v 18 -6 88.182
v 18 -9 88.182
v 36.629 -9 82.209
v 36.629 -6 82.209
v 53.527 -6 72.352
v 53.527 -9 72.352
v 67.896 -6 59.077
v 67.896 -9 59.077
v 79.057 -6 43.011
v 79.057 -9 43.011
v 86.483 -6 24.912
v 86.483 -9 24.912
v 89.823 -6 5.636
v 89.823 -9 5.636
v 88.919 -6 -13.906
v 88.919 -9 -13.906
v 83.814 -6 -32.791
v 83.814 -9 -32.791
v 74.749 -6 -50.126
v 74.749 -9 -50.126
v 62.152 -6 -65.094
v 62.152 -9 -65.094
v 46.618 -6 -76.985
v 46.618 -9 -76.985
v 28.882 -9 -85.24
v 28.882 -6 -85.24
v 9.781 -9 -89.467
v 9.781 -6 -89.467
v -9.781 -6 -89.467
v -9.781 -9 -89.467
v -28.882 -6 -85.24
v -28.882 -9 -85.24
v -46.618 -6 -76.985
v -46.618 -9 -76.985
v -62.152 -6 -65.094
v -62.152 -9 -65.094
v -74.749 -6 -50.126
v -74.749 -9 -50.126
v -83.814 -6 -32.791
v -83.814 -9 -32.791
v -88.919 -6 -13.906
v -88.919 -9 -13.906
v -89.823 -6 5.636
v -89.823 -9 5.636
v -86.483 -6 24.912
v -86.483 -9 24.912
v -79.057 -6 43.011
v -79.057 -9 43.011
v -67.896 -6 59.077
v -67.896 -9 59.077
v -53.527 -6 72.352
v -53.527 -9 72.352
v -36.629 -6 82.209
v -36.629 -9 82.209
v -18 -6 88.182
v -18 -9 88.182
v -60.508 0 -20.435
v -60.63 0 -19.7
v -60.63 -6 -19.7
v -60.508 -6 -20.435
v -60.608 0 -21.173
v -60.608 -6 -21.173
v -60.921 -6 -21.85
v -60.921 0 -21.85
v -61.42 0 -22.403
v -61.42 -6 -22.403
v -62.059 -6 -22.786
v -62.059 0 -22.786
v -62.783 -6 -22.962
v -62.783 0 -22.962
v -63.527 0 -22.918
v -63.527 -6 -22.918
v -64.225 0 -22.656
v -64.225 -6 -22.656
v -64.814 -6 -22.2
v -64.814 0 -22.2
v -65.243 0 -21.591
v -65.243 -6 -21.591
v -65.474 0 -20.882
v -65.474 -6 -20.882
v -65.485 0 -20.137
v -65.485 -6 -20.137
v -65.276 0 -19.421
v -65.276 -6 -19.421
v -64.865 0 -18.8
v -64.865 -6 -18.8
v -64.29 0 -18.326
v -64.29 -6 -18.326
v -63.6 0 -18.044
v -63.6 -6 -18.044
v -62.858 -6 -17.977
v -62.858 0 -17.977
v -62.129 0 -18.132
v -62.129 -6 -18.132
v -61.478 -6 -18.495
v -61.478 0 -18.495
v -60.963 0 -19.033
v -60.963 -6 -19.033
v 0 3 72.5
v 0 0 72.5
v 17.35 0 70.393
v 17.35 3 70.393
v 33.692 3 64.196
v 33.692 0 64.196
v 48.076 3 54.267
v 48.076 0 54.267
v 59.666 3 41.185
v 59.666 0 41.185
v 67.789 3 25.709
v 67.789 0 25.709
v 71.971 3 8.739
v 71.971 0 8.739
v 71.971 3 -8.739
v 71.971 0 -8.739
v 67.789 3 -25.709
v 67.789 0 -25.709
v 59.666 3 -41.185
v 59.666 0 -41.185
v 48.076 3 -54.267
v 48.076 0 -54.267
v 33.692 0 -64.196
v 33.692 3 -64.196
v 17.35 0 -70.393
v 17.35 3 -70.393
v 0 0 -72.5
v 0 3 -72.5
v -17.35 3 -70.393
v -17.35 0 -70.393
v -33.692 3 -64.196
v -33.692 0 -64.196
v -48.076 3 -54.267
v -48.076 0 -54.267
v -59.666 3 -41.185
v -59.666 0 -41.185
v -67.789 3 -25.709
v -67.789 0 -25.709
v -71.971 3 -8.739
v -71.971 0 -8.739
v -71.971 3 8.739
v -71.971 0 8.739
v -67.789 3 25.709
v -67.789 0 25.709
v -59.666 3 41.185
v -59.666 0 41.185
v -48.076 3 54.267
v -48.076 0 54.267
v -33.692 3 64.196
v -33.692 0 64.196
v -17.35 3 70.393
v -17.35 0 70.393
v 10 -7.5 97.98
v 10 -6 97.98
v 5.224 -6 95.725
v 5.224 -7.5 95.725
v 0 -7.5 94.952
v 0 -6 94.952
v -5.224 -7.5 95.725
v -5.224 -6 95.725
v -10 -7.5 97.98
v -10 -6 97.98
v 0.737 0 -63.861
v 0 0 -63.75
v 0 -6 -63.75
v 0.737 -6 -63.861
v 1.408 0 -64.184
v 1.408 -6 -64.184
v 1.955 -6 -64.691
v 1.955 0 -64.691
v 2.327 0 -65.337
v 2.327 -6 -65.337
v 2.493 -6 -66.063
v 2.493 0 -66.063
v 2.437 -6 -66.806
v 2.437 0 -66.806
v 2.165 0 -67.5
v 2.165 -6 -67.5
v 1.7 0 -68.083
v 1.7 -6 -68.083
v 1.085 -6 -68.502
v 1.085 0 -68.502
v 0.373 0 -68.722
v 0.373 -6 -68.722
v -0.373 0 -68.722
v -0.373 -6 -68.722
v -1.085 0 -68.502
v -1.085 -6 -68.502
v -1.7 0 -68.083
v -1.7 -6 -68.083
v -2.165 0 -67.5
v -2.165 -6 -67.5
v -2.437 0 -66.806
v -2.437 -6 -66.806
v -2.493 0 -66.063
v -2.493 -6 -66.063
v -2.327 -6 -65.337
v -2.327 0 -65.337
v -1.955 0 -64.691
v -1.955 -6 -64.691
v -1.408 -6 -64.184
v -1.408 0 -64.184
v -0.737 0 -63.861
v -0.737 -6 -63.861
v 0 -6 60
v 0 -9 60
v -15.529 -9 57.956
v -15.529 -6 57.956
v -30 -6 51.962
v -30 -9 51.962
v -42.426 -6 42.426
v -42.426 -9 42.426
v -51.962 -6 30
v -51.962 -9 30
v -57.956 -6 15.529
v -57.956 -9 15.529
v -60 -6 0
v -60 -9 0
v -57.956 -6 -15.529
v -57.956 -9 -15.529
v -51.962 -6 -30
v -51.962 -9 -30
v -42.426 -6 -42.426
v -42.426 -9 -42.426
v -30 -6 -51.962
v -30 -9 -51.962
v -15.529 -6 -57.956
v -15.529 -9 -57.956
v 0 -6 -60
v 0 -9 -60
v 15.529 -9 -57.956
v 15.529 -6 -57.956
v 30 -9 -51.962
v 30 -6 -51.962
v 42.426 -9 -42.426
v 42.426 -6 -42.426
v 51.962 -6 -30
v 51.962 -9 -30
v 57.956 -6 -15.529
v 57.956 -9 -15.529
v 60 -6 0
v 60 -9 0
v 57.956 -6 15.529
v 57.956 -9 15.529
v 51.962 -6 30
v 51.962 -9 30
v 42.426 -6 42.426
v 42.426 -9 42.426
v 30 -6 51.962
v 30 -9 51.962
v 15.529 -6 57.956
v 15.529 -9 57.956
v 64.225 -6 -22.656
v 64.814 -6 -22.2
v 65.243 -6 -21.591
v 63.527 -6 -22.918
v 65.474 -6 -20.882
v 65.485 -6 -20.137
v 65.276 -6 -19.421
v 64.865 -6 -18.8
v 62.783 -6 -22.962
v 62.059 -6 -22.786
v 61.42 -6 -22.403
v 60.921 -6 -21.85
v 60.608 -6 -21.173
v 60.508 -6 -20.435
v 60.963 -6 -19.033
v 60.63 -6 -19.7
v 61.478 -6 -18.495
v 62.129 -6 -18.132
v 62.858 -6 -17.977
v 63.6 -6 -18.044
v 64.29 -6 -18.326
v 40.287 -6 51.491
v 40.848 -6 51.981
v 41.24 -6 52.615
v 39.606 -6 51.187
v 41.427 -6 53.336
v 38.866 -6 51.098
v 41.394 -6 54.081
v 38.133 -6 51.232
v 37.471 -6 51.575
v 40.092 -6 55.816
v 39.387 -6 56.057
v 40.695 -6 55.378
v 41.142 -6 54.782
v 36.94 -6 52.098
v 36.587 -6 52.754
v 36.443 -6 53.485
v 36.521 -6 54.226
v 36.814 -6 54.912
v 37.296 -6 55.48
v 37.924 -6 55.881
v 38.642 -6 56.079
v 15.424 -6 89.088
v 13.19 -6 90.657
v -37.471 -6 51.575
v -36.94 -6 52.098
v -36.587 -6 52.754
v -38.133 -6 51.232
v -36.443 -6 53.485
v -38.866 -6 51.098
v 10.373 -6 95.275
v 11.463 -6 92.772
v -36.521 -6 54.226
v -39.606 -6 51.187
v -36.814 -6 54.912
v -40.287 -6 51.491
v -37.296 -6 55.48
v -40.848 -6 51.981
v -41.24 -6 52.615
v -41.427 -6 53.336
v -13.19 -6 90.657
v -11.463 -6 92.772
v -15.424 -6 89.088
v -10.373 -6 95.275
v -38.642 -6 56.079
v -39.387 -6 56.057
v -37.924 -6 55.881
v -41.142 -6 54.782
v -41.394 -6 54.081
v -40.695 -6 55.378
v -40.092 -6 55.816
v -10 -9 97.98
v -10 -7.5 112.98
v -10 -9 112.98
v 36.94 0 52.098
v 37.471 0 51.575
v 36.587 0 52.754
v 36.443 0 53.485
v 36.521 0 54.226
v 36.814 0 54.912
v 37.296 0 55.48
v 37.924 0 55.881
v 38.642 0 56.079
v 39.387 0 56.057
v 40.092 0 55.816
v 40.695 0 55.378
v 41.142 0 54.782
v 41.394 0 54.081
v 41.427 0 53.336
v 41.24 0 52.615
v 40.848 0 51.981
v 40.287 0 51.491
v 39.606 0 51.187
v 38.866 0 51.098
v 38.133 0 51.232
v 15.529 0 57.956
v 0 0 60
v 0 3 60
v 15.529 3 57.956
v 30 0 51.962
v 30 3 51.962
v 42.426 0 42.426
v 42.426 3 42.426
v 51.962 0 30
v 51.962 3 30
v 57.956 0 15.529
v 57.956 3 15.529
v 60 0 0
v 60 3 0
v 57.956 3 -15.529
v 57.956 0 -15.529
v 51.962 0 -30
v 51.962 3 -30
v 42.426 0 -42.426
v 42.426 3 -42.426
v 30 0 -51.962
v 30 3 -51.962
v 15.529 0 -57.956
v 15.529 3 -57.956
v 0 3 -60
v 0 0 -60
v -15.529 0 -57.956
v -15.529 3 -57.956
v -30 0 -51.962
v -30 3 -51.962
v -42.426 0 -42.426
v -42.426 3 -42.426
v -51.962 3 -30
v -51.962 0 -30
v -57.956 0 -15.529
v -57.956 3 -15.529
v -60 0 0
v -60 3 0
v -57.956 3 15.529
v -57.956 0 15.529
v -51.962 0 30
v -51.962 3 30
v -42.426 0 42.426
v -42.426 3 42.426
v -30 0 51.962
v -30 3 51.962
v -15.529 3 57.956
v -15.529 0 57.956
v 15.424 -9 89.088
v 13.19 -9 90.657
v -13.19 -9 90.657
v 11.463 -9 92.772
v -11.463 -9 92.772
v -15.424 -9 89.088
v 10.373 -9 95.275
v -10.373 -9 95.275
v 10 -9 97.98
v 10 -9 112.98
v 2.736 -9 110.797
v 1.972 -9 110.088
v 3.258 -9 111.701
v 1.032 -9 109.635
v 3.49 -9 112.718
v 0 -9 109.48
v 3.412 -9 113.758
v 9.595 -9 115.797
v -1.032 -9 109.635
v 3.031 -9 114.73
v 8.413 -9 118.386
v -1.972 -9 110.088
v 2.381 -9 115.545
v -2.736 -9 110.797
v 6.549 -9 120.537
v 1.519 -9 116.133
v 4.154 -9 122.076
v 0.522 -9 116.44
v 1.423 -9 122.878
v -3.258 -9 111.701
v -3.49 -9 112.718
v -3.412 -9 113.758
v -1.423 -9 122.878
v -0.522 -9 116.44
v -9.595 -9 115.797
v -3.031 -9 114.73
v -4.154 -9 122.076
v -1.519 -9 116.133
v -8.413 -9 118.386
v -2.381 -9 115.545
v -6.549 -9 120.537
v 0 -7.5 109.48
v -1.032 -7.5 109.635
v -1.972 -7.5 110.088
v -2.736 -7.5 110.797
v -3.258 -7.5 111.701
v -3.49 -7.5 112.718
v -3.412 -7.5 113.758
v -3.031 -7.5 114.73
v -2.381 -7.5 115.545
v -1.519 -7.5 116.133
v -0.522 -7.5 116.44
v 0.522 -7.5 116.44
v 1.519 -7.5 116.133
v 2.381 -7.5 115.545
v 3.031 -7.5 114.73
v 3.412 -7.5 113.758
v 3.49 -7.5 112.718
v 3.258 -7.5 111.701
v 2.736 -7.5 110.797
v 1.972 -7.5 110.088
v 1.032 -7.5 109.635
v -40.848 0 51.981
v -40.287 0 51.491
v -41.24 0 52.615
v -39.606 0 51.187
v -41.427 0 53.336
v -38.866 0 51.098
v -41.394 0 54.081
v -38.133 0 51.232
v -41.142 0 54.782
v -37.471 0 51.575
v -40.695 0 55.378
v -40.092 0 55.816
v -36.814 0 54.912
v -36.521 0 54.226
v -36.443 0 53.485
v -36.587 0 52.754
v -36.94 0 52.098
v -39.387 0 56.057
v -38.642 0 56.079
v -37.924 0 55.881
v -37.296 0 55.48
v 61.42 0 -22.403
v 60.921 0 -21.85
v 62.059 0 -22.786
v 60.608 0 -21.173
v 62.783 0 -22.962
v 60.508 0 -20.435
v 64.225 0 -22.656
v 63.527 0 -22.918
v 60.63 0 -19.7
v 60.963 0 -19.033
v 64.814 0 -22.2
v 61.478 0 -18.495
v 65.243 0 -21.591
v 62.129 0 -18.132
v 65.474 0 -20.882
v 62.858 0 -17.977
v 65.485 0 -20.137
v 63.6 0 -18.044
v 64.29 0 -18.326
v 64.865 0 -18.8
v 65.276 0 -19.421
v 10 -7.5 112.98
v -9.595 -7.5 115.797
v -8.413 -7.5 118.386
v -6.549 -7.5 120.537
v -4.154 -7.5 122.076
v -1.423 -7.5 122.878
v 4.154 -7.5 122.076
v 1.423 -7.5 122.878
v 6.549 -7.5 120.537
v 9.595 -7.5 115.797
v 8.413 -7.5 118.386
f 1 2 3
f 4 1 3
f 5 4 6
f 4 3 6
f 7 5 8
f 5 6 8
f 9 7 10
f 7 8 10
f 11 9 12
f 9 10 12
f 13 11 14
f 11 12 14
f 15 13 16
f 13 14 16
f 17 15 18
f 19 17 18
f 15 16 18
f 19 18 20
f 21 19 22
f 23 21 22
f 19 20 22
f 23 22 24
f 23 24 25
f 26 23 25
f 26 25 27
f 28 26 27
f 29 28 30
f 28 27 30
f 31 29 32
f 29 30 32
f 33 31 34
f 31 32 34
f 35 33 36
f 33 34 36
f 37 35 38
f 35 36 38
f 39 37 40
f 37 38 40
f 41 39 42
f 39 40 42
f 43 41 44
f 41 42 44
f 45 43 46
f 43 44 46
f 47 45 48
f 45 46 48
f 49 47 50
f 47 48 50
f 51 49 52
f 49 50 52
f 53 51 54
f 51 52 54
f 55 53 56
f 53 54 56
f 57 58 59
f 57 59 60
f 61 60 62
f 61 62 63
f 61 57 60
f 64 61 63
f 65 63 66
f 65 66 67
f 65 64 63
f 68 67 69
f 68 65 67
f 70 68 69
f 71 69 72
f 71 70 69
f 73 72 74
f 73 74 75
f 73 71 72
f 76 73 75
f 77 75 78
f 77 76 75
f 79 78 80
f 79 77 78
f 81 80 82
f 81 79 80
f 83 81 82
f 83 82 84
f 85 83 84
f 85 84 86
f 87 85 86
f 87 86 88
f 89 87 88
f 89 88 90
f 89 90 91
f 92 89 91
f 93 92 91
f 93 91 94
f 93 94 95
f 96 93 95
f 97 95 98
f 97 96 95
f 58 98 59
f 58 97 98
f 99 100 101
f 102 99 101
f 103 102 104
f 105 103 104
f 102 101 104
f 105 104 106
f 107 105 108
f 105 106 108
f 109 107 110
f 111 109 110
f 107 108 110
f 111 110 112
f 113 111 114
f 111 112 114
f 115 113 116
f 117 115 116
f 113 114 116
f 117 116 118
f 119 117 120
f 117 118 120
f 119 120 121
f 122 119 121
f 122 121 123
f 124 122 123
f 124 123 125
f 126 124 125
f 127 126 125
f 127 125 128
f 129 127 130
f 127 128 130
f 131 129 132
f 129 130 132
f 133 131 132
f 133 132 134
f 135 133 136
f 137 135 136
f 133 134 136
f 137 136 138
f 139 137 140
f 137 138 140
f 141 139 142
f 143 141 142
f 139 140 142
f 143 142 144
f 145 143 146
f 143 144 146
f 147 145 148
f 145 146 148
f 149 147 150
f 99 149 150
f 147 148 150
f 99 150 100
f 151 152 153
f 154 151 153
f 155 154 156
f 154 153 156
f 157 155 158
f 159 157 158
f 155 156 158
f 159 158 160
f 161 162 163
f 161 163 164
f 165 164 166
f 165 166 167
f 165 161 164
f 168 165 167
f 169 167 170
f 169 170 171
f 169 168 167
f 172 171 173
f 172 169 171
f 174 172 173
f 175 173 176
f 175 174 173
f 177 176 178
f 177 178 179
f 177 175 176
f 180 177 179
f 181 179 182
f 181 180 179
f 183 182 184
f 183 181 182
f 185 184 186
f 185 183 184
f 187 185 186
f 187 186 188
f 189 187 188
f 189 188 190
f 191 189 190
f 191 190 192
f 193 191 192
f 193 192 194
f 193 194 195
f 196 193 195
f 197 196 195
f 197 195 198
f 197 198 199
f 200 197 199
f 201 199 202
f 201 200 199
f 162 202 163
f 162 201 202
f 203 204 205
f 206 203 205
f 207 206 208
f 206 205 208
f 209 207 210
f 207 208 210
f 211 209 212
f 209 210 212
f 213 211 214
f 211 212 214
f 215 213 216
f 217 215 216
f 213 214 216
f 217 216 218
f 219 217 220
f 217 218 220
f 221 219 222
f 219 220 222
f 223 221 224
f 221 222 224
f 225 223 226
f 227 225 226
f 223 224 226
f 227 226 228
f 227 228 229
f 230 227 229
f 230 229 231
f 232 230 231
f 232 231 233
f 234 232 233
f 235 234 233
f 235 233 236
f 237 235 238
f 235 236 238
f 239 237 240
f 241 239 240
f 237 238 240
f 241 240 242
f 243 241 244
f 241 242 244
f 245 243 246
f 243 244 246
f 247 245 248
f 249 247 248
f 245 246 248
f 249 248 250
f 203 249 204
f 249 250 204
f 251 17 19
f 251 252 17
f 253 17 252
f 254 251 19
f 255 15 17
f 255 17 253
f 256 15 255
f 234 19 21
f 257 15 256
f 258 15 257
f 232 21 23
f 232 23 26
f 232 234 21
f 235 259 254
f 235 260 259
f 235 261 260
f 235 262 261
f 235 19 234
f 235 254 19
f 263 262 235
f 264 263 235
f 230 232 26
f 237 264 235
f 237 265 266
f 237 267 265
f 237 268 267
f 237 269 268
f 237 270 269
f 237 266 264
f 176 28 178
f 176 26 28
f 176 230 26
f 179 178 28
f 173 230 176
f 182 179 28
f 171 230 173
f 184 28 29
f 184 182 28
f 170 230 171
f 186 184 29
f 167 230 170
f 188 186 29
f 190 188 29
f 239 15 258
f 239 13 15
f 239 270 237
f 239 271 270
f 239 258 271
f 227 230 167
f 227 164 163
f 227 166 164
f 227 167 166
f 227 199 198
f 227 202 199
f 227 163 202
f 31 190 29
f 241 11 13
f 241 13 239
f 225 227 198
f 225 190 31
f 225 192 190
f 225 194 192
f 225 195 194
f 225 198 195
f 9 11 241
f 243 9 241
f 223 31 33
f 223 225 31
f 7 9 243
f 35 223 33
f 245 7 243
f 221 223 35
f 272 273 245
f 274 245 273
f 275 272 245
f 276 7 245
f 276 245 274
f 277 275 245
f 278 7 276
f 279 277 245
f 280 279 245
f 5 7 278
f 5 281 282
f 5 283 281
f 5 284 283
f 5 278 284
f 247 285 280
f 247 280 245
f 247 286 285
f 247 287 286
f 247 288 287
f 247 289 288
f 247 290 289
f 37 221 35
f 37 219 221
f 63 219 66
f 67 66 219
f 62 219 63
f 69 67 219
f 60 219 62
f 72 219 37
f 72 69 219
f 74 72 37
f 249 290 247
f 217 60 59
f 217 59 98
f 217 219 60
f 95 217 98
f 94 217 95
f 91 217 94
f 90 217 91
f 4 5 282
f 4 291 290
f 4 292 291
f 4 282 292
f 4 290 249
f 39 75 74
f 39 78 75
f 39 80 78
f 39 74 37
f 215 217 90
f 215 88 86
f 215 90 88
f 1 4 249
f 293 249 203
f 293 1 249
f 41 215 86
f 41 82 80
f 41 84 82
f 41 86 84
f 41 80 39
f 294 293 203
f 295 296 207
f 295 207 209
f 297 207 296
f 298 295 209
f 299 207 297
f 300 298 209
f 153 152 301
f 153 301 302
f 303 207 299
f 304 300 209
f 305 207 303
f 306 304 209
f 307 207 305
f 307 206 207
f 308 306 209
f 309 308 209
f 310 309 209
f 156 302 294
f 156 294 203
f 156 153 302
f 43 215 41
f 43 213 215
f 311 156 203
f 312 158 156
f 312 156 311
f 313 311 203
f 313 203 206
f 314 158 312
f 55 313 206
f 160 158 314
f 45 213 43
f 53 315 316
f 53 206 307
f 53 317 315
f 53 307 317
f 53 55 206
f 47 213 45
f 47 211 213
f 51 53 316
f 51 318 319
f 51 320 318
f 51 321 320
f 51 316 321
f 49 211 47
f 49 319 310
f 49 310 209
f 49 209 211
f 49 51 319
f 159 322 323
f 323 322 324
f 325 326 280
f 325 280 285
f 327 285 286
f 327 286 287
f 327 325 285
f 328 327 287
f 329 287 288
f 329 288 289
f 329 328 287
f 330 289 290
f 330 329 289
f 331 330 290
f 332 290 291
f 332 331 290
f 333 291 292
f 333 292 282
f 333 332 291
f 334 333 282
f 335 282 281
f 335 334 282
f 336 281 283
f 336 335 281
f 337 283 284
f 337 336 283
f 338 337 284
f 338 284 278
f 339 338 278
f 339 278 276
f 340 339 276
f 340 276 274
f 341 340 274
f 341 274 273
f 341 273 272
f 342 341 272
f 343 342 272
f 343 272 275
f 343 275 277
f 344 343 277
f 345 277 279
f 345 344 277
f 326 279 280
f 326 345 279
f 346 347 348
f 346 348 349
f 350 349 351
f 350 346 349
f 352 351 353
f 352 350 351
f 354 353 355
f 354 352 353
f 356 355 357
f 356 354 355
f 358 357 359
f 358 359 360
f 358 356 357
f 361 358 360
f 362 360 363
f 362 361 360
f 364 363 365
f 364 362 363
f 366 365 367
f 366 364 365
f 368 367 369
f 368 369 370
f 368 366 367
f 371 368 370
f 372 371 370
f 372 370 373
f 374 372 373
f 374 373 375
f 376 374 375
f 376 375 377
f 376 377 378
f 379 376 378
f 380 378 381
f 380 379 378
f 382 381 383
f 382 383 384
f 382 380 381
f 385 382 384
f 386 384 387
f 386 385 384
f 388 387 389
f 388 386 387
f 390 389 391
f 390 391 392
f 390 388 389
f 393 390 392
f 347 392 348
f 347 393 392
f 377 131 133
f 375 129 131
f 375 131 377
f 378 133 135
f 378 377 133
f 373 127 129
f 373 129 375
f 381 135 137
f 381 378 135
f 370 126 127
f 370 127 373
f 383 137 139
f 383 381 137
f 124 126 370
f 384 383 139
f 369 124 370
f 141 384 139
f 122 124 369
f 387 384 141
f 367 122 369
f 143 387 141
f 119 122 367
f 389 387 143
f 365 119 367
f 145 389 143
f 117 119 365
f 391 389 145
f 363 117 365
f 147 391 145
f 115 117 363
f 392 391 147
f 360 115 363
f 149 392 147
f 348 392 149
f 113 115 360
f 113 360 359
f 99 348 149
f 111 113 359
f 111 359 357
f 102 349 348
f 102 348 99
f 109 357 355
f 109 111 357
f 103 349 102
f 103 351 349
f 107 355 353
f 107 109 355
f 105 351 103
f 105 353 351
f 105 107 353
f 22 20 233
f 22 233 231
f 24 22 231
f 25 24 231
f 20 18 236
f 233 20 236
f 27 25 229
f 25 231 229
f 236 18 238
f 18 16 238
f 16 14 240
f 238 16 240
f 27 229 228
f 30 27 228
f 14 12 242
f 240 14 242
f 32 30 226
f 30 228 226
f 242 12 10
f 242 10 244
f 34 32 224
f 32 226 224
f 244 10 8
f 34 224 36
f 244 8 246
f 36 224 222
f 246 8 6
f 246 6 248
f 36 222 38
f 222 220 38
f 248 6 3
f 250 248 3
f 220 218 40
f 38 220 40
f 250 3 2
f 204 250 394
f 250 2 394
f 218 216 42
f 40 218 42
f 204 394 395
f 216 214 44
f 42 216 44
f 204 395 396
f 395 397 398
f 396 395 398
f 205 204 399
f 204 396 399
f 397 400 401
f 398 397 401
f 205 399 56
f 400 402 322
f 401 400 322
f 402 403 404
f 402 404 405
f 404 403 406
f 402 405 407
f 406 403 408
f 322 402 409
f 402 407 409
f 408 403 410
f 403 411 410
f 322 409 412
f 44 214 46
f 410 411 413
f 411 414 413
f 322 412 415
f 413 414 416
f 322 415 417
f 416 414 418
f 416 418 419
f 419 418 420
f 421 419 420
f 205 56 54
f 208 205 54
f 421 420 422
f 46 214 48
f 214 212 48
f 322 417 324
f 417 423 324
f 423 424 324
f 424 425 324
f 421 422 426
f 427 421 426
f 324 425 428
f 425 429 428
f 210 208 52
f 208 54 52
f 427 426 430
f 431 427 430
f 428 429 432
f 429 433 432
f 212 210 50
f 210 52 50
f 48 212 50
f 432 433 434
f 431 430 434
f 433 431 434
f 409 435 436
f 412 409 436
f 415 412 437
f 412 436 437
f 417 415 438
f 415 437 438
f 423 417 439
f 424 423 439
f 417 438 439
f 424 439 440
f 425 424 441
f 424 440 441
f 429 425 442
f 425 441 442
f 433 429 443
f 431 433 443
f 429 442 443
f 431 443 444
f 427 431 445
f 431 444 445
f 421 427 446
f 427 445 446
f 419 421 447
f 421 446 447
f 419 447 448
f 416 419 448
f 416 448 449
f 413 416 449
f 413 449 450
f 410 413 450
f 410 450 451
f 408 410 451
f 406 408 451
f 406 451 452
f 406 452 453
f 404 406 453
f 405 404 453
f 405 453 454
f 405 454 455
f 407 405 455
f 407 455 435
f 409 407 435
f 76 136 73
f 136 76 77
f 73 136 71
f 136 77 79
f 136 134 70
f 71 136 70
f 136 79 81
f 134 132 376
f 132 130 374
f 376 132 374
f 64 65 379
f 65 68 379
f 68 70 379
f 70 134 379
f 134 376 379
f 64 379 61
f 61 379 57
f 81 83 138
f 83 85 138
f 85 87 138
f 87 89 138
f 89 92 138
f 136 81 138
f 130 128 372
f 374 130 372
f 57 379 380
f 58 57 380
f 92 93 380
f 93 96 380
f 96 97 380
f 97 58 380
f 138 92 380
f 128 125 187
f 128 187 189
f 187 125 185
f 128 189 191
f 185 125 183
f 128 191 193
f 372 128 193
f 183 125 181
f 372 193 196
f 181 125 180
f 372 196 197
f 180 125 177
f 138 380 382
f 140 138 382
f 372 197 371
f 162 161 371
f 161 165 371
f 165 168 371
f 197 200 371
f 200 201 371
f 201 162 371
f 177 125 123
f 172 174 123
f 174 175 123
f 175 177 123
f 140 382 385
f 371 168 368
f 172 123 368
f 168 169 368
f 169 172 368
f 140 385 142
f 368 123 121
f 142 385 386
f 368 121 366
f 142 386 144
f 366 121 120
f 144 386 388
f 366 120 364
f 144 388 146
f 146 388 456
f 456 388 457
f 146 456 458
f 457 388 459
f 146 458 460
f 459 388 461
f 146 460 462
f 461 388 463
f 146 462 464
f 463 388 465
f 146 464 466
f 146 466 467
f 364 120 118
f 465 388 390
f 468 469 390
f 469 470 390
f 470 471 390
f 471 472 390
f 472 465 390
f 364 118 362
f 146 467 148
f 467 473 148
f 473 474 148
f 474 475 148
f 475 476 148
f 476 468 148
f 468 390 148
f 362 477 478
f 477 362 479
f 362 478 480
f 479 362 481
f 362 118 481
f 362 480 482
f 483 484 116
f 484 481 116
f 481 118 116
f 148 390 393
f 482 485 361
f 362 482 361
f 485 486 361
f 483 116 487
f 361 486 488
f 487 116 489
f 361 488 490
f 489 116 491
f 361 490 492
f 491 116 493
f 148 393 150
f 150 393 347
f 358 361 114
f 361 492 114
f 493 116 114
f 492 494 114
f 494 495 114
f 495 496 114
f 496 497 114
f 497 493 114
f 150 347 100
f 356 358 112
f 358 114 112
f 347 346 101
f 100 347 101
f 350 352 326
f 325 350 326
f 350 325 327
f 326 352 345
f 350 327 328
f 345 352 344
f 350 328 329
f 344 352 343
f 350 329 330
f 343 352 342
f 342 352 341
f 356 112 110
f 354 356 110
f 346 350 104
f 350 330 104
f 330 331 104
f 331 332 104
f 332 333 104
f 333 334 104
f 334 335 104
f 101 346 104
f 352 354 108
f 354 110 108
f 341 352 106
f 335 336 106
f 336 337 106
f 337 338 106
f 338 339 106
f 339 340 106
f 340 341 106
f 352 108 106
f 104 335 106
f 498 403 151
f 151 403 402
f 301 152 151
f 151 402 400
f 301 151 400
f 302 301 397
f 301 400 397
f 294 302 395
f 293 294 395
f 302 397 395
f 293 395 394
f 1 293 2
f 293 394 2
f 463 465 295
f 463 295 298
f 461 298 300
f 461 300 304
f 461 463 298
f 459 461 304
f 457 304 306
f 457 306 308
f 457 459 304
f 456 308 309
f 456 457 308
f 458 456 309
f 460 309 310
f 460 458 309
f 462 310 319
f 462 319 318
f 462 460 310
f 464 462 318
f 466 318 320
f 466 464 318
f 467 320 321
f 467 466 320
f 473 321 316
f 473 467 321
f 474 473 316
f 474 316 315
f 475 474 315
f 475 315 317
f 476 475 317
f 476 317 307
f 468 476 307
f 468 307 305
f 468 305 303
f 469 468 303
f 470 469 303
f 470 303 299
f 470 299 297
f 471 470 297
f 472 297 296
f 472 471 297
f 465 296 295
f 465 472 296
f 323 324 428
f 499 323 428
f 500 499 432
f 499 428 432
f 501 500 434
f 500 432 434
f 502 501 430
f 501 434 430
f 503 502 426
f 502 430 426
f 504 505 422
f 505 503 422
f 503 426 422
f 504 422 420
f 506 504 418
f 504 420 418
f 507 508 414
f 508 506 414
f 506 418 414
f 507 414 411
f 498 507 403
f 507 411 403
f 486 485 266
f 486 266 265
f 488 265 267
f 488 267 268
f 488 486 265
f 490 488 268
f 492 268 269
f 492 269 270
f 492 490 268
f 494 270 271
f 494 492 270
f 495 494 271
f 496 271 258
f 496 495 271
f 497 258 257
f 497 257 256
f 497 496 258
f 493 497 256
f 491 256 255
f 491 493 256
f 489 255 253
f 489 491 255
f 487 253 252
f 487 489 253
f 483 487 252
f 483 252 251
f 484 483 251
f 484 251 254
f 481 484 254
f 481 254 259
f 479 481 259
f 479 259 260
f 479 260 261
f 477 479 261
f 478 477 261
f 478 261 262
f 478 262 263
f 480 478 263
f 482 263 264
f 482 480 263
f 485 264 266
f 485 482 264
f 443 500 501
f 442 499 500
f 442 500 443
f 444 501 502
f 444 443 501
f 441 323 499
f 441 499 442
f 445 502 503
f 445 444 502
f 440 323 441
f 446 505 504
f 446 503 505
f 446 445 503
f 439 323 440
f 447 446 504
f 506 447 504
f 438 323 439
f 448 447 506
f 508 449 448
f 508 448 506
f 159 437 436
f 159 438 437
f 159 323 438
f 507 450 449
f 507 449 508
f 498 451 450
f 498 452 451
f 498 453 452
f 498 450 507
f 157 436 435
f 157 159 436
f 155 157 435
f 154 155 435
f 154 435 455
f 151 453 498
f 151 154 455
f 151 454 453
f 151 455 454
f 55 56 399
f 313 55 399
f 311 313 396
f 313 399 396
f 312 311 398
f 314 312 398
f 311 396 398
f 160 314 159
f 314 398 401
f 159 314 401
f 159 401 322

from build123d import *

# Parameters (mm, degrees)
SKETCH_1_R               = 72.5
SKETCH_1_R_2             = 60
EXTRUDE_1_DEPTH          = 3
SKETCH_2_R               = 2.5
EXTRUDE_2_DEPTH          = 6
PATTERN_CIRCULAR_1_COUNT = 5
EXTRUDE_START            = 3
SKETCH_3_R               = 60
EXTRUDE_3_DEPTH          = 3
SKETCH_4_R               = 3.5
CUT_EXTRUDE_1_DEPTH      = 10
SKETCH_5_R               = 18.027756377
CUT_EXTRUDE_2_DEPTH      = 1.5


with BuildPart() as part:
    # 草图1 → 凸台-拉伸1 (new body)
    with BuildSketch(Plane(origin=(0, 0, 0), x_dir=(1, 0, 0), z_dir=(0, 1, 0))):
        with Locations(Location((0, 0, 0), (0, 0, 270))):
            Circle(SKETCH_1_R)
        with Locations(Location((0, 0, 0), (0, 0, 270))):
            Circle(SKETCH_1_R_2, mode=Mode.SUBTRACT)
    extrude(amount=EXTRUDE_1_DEPTH)

    # 草图2 → 凸台-拉伸2 (add)
    with BuildSketch(Plane(origin=(0, 0, 0), x_dir=(1, 0, 0), z_dir=(0, 1, 0))):
        with Locations(Location((0, 66.25, 0), (0, 0, 270))):
            Circle(SKETCH_2_R)
    extrude_2 = extrude(amount=-EXTRUDE_2_DEPTH)

    # 阵列(圆周)1: 凸台-拉伸2 ×5 about axis
    pattern_circular_1_axis = Axis((0, 0, 0), (0, 1, 0))
    for i in range(1, PATTERN_CIRCULAR_1_COUNT):
        add(extrude_2.rotate(pattern_circular_1_axis, i * 360 / PATTERN_CIRCULAR_1_COUNT))

    # 草图3 → 凸台-拉伸3 (add)
    with BuildSketch(Plane.XZ.offset(6).offset(EXTRUDE_START)):
        with BuildLine():
            Line((10, 112.979589711), (10, 97.979589711))
            ThreePointArc((10, 97.979589711), (12.254033308, 91.655034391), (18, 88.18163074))
            ThreePointArc((18, 88.18163074), (0, -90), (-18, 88.18163074))
            ThreePointArc((-18, 88.18163074), (-12.254033308, 91.655034391), (-10, 97.979589711))
            Line((-10, 97.979589711), (-10, 112.979589711))
            ThreePointArc((-10, 112.979589711), (0, 122.979589711), (10, 112.979589711))
        make_face()
        with Locations(Location((0, 0, 0), (0, 0, 90))):
            Circle(SKETCH_3_R, mode=Mode.SUBTRACT)
    extrude(amount=-EXTRUDE_3_DEPTH)

    # 草图4 → 切除-拉伸1 (cut)
    with BuildSketch(Plane(origin=(0, 0, 0), x_dir=(1, 0, 0), z_dir=(0, 1, 0))):
        with Locations(Location((0, -112.979589711, 0), (0, 0, 90))):
            Circle(SKETCH_4_R)
    extrude(amount=-CUT_EXTRUDE_1_DEPTH, mode=Mode.SUBTRACT)

    # 草图5 → 切除-拉伸2 (cut)
    with BuildSketch(Plane(origin=(0, -6, 0), x_dir=(1, 0, 0), z_dir=(0, 1, 0))):
        with Locations((0, -112.979589711)):
            Circle(SKETCH_5_R)
    extrude(amount=-CUT_EXTRUDE_2_DEPTH, mode=Mode.SUBTRACT)


solid = part.part
